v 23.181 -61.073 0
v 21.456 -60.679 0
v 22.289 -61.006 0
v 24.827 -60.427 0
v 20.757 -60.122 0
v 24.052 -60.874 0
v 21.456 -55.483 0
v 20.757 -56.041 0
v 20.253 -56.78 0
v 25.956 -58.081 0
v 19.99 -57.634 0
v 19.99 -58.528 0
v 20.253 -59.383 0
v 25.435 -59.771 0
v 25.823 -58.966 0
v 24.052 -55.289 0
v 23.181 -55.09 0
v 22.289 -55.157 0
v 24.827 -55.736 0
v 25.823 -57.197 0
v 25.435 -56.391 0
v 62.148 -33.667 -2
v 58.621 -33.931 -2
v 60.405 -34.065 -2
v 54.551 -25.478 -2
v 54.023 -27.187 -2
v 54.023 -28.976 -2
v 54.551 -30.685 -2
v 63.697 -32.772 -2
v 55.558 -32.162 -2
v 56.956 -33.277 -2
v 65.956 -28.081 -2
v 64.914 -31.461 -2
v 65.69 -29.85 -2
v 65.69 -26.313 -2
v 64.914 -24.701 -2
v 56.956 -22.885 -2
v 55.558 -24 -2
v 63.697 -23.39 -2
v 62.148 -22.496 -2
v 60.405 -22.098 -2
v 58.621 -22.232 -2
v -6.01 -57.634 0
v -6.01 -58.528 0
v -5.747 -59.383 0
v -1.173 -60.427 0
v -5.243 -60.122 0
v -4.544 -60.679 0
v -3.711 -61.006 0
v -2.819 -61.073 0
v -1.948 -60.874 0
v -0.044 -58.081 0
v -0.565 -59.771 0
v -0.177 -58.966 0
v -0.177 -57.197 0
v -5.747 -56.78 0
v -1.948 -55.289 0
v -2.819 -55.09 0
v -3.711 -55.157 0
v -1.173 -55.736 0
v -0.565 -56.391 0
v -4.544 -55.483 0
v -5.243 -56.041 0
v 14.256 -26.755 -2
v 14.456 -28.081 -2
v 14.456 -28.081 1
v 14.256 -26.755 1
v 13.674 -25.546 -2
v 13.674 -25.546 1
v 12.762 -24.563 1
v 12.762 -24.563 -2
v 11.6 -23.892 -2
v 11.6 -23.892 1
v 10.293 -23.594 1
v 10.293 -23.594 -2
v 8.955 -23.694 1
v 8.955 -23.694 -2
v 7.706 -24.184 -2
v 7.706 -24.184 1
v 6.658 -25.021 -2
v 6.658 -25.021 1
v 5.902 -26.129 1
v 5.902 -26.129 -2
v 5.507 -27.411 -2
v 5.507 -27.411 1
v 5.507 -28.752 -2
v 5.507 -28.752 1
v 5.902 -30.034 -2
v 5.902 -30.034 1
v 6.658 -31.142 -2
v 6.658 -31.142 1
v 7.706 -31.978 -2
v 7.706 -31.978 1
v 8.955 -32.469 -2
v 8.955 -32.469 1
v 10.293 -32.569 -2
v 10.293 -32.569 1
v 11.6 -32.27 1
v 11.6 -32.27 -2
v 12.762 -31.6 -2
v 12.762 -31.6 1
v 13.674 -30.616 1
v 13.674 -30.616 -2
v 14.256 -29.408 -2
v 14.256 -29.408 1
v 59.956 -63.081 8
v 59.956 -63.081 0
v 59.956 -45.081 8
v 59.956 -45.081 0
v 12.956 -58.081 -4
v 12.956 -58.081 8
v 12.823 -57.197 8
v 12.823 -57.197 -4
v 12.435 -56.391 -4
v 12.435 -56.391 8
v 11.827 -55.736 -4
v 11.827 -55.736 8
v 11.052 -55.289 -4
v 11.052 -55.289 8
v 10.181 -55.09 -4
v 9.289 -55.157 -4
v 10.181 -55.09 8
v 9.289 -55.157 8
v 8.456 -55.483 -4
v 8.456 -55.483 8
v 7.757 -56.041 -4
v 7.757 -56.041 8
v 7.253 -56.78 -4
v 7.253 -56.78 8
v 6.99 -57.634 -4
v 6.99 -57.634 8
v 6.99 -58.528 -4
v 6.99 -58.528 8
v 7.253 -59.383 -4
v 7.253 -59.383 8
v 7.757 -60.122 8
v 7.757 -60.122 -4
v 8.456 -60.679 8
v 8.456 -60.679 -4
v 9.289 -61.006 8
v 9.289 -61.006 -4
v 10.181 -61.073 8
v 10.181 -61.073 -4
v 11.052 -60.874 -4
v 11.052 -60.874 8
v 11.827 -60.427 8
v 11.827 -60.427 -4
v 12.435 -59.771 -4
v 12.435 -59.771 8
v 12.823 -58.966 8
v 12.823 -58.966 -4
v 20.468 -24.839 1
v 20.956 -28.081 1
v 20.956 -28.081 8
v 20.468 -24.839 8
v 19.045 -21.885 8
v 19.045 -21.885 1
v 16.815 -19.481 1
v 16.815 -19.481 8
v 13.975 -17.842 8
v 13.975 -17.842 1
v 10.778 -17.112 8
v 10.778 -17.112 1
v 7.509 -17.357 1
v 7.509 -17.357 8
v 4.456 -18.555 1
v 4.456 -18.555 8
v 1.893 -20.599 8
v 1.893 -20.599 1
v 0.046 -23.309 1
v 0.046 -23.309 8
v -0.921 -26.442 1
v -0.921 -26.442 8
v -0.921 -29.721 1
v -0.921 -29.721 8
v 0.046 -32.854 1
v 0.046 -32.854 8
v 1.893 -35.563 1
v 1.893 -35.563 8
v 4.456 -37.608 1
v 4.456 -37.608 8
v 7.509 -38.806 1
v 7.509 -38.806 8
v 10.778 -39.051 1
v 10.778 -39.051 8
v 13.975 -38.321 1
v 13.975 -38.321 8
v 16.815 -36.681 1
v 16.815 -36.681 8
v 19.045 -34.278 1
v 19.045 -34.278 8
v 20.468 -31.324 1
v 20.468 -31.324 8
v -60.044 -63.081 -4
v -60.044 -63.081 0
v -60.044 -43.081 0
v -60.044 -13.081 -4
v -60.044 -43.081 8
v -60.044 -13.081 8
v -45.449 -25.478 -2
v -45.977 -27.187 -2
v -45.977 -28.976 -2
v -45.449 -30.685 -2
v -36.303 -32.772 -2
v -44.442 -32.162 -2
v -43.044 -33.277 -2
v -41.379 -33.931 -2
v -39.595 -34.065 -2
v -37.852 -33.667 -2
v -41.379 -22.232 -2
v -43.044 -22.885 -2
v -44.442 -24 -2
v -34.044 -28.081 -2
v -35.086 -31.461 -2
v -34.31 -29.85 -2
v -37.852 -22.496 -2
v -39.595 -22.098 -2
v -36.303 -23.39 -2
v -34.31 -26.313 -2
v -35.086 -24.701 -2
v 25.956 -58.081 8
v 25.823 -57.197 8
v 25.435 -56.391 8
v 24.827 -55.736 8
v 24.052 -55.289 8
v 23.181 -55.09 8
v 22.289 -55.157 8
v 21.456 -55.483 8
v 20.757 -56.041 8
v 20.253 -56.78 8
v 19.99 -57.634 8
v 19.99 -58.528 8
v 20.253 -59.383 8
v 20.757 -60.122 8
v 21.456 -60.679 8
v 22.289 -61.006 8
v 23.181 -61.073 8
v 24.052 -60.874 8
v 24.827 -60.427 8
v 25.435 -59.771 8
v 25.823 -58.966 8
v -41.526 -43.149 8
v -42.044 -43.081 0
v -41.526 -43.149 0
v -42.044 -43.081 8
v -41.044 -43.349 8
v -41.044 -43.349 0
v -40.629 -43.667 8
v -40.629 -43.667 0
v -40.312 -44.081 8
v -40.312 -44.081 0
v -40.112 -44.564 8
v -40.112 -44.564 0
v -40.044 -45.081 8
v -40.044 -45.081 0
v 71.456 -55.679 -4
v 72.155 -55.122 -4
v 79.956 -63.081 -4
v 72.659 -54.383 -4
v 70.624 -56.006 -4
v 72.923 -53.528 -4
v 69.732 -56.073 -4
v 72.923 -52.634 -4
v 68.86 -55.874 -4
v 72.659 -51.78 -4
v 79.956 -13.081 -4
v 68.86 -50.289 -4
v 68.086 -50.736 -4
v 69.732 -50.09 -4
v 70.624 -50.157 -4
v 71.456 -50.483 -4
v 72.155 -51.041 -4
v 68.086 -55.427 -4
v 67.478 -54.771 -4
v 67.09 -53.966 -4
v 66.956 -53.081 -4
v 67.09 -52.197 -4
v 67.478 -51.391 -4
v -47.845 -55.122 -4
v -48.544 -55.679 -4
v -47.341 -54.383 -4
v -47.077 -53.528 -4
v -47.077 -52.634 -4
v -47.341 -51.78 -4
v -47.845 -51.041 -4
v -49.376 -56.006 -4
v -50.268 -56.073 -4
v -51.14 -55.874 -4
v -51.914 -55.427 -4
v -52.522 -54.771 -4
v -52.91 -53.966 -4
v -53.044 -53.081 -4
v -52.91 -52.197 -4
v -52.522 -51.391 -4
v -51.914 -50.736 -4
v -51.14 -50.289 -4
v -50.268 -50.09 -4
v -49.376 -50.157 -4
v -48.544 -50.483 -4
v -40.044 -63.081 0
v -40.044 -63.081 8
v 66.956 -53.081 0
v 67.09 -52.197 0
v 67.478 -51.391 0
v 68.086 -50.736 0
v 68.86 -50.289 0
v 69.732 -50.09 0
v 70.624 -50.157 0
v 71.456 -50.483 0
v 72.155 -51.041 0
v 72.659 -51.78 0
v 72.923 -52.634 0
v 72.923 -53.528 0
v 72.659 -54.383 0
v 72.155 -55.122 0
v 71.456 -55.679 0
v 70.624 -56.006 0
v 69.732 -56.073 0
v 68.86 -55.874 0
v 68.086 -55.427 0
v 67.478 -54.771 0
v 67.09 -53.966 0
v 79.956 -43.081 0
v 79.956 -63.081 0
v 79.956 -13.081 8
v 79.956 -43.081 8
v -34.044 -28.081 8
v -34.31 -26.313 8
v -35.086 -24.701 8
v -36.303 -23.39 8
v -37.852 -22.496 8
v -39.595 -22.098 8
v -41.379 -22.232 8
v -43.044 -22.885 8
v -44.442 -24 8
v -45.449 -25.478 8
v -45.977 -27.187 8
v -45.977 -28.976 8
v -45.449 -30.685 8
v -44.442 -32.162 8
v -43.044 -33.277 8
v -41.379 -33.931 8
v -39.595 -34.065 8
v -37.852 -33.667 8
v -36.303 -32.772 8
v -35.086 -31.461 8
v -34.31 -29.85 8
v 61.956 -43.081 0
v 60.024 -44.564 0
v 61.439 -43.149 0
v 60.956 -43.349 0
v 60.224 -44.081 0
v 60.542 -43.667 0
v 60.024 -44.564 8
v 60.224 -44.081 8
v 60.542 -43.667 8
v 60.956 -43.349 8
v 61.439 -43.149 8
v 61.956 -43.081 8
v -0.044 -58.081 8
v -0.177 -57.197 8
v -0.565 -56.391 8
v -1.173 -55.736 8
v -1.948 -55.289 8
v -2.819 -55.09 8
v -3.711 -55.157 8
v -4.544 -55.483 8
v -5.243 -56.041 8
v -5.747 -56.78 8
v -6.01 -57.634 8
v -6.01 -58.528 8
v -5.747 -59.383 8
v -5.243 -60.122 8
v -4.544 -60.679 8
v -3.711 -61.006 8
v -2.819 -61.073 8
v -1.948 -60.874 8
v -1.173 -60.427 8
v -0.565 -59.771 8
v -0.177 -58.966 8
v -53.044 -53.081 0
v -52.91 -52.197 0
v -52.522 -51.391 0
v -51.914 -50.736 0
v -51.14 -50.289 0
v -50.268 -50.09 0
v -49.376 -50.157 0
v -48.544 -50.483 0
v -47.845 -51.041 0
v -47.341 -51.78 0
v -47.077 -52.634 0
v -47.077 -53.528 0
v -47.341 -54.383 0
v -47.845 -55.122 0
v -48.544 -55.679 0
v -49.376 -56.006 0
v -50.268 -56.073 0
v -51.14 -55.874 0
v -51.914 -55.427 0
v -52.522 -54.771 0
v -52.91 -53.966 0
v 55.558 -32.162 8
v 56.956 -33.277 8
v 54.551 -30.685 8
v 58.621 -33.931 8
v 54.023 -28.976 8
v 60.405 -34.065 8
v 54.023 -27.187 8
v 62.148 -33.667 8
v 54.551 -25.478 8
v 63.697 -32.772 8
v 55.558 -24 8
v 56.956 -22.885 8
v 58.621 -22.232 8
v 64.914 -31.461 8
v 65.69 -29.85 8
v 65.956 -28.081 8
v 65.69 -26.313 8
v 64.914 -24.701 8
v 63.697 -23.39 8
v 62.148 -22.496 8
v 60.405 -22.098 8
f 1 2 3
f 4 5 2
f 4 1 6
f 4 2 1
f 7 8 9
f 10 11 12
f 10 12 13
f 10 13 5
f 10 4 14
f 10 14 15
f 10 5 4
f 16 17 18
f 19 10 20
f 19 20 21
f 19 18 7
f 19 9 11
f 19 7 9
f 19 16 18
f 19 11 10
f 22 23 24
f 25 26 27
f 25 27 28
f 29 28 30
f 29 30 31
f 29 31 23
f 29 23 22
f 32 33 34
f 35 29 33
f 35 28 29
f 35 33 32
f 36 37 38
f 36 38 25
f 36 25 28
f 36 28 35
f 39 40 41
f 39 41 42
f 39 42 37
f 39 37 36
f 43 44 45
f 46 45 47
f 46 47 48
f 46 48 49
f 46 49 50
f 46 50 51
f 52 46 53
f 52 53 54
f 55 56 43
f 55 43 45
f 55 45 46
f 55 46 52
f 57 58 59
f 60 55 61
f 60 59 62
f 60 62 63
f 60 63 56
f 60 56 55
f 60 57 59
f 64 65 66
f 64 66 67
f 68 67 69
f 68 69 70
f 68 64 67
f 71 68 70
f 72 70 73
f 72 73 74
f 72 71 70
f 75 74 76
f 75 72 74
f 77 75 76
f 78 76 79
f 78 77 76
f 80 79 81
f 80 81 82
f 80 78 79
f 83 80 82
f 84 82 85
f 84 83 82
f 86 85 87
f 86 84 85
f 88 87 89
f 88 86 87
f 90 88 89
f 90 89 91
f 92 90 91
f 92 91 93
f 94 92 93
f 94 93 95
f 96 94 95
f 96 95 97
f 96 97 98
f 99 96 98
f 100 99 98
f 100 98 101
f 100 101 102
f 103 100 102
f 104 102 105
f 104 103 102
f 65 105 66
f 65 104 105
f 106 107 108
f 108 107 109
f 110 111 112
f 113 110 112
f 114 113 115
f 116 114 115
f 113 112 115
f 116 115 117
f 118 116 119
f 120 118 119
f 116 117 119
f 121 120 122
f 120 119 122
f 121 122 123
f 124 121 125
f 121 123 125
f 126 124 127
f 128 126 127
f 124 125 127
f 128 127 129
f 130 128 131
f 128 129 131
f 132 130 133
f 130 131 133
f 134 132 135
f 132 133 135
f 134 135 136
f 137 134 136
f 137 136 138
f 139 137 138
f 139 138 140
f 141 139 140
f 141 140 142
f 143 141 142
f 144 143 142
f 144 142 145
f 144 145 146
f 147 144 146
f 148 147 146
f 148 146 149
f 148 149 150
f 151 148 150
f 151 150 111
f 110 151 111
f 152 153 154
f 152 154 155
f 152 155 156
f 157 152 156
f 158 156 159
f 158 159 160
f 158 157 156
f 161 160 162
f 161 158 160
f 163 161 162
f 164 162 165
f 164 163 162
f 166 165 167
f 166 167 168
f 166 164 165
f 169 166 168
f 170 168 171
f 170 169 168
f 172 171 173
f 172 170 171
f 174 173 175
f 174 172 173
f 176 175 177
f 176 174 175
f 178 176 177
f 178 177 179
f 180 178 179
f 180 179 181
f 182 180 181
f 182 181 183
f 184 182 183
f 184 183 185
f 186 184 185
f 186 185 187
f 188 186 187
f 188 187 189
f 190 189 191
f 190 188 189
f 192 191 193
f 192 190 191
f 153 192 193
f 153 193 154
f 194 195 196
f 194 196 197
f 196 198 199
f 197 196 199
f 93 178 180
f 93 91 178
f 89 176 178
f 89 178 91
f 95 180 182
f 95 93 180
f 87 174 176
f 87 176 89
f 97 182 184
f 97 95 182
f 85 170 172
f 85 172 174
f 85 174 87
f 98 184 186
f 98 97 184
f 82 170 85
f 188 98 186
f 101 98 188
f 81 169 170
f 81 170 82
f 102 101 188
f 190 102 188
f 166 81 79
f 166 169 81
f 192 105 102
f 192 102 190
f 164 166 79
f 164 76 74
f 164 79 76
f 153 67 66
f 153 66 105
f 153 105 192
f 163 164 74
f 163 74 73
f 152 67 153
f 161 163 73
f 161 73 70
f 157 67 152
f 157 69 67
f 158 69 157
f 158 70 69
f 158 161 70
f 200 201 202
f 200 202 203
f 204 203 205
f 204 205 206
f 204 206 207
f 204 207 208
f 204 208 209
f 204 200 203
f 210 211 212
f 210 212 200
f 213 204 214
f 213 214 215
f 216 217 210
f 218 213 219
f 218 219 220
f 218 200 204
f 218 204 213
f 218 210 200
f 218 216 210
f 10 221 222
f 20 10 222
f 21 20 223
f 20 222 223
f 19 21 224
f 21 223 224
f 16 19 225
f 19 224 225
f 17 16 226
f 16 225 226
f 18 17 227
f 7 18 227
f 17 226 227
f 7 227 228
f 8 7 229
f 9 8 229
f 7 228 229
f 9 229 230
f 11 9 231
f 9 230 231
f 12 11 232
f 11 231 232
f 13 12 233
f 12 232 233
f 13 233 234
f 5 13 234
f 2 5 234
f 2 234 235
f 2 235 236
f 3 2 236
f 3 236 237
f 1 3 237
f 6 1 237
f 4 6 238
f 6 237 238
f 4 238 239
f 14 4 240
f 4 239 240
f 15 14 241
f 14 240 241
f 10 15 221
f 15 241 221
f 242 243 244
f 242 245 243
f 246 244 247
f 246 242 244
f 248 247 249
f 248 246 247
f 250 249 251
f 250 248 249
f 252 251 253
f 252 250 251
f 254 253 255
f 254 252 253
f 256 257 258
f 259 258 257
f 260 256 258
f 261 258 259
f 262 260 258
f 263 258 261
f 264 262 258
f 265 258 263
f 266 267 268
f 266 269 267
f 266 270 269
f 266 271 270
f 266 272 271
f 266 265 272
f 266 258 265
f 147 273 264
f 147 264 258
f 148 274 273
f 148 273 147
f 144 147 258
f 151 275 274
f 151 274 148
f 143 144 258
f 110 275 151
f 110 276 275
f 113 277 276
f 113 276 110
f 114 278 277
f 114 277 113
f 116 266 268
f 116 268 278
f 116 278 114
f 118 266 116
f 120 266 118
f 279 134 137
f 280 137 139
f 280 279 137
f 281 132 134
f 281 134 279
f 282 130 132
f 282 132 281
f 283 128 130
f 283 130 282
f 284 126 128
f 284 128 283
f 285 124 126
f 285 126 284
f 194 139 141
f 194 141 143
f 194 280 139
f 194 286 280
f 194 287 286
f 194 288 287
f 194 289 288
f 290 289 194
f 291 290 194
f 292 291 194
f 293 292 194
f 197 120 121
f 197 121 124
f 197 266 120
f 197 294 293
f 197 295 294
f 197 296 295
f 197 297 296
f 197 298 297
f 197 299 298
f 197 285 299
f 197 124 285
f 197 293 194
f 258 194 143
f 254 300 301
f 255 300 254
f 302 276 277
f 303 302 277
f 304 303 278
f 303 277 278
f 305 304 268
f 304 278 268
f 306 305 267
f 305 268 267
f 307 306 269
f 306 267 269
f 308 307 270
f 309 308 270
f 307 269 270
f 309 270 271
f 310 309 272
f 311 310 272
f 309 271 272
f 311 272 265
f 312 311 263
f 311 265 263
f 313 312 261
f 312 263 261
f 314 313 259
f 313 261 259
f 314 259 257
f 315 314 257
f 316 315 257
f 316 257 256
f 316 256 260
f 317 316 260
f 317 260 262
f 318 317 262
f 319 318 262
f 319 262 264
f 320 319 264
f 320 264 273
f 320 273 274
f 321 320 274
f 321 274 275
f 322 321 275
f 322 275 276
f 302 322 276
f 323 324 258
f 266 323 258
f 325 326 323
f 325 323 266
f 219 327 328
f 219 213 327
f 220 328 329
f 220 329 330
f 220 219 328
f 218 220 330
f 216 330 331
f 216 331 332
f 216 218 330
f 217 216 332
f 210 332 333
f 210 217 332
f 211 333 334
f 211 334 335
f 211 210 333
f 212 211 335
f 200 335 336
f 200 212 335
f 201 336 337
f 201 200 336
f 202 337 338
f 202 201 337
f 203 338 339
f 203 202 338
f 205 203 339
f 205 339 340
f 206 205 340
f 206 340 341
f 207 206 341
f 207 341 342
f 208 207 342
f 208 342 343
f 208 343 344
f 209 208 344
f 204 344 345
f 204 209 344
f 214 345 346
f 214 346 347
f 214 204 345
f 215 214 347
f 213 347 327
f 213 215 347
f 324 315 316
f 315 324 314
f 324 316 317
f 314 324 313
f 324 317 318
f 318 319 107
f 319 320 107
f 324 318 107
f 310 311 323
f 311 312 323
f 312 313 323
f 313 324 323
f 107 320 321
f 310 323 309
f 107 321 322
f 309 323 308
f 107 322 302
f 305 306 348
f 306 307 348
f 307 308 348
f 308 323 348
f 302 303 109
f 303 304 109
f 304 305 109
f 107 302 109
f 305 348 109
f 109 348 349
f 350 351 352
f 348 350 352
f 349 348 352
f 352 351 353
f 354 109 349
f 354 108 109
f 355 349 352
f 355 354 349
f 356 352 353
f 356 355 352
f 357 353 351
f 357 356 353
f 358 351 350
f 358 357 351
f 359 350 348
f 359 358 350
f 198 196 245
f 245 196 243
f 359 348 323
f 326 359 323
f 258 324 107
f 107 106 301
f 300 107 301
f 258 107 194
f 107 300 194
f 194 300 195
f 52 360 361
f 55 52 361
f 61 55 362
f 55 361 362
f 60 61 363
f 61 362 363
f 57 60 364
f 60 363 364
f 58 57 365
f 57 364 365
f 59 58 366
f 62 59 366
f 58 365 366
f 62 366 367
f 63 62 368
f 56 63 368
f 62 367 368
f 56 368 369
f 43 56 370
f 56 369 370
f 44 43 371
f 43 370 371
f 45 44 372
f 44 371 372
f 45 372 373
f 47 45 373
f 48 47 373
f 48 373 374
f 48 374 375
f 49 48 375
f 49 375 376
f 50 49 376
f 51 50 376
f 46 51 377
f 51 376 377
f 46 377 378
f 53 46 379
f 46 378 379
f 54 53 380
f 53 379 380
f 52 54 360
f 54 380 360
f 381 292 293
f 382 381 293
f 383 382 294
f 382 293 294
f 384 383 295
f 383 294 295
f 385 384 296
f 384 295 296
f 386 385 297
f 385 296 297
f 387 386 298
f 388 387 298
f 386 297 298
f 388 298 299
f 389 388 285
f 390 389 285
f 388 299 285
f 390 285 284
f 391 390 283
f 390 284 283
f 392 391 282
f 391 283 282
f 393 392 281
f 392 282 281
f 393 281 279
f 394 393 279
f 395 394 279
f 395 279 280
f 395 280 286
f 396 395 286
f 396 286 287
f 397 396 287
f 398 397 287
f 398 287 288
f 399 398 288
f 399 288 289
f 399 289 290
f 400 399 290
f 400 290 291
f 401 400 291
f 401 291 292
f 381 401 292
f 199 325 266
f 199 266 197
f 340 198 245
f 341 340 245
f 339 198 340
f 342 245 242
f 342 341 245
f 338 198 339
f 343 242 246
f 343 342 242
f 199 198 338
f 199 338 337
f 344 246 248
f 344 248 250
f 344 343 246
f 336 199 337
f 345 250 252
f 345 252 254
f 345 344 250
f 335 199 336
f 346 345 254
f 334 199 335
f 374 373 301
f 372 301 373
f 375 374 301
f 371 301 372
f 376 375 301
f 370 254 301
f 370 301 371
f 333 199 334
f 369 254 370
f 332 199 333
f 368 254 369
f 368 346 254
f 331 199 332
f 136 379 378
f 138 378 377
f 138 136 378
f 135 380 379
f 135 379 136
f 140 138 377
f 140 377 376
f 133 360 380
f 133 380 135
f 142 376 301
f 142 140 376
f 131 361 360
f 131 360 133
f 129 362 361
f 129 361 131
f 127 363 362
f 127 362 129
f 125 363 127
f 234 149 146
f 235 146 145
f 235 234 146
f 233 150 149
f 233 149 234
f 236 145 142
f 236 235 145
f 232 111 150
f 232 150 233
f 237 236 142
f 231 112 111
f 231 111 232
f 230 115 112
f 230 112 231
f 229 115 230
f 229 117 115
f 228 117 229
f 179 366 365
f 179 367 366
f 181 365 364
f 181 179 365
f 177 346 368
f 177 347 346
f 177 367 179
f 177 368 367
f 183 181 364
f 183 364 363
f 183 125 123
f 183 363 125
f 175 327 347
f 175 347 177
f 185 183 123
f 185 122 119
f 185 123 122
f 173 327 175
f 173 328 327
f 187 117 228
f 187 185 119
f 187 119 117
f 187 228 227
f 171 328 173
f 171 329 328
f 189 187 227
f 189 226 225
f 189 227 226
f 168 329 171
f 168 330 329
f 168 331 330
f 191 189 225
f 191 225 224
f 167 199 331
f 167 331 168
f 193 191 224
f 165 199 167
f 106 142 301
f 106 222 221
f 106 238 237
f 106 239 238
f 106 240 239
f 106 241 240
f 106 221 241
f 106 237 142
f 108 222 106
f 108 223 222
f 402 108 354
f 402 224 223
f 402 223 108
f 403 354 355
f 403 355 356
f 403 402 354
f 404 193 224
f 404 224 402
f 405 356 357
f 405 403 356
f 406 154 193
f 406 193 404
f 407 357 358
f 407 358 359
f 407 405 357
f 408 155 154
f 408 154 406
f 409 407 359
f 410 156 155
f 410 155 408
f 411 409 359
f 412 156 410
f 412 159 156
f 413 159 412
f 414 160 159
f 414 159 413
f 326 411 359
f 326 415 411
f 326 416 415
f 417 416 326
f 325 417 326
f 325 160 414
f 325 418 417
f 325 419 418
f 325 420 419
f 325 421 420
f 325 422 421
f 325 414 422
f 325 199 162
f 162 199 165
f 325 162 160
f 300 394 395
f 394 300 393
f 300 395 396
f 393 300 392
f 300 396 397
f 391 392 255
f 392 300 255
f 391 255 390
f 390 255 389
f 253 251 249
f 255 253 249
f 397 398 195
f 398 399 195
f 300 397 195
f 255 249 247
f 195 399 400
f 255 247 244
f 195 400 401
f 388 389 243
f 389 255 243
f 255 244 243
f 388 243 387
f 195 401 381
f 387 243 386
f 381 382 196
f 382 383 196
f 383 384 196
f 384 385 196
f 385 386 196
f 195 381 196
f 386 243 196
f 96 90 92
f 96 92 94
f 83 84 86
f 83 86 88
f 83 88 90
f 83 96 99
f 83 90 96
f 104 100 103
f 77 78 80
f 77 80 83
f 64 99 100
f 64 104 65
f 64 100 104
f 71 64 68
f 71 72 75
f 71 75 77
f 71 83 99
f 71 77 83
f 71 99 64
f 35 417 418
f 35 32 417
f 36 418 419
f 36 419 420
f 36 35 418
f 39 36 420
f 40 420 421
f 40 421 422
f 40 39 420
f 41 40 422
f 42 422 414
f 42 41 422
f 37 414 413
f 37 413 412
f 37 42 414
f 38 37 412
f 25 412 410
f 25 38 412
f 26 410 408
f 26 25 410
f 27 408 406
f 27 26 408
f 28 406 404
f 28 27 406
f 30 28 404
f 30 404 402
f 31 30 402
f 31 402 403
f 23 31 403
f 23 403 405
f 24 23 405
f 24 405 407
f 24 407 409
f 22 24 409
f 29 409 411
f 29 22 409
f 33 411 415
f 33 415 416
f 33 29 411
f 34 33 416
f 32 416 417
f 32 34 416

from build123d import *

# Parameters (mm, degrees)
ESQUISSE1_W             = 140
ESQUISSE1_H             = 30
ESQUISSE1_R             = 11
ESQUISSE1_R_2           = 6
EXTRUSION1_DEPTH        = 8
ESQUISSE2_W             = 140
ESQUISSE2_H             = 50
BOSS_EXTRU_1_DEPTH      = 4
ESQUISSE3_R             = 3
ENL_V_MAT_EXTRU_1_DEPTH = 13
ESQUISSE4_R             = 11
ENL_V_MAT_EXTRU_2_DEPTH = 2
ESQUISSE5_W             = 100
ESQUISSE5_H             = 20
BOSS_EXTRU_2_DEPTH      = 8
ESQUISSE6_R             = 3
ENL_V_MAT_EXTRU_3_DEPTH = 8
ESQUISSE8_R             = 6
ENL_V_MAT_EXTRU_4_DEPTH = 2
ESQUISSE9_R             = 11
ESQUISSE9_R_2           = 4.5
BOSS_EXTRU_3_DEPTH      = 3
ESQUISSE10_R            = 3
ENL_V_MAT_EXTRU_5_DEPTH = 13
CONG_1_R                = 2
CONG_2_R                = 2


with BuildPart() as part:
    # Esquisse1 → Extrusion1 (new body)
    with BuildSketch(Plane.XY):
        with Locations((9.95634141, -28.081325038)):
            Rectangle(ESQUISSE1_W, ESQUISSE1_H)
        with Locations((9.95634141, -28.081325038)):
            Circle(ESQUISSE1_R, mode=Mode.SUBTRACT)
        with Locations((-40.04365859, -28.081325038)):
            Circle(ESQUISSE1_R_2, mode=Mode.SUBTRACT)
        with Locations((59.95634141, -28.081325038)):
            Circle(ESQUISSE1_R_2, mode=Mode.SUBTRACT)
    extrude(amount=EXTRUSION1_DEPTH)

    # Esquisse2 → Boss.-Extru.1 (add)
    with BuildSketch(Plane(origin=(0, 0, 0), x_dir=(-1, 0, 0), z_dir=(0, 0, -1))):
        with Locations((-9.95634141, -38.081325038)):
            Rectangle(ESQUISSE2_W, ESQUISSE2_H)
    extrude(amount=BOSS_EXTRU_1_DEPTH)

    # Esquisse3 → Enlèv. mat.-Extru.1 (cut, through all)
    with BuildSketch(Plane(origin=(0, 0, -4), x_dir=(-1, 0, 0), z_dir=(0, 0, -1))):
        with Locations((-69.95634141, -53.081325038)):
            Circle(ESQUISSE3_R)
        with Locations((50.04365859, -53.081325038)):
            Circle(ESQUISSE3_R)
    extrude(amount=-ENL_V_MAT_EXTRU_1_DEPTH, mode=Mode.SUBTRACT)

    # Esquisse4 → Enlèv. mat.-Extru.2 (cut)
    with BuildSketch(Plane.XY):
        with Locations((9.95634141, -28.081325038)):
            Circle(ESQUISSE4_R)
    extrude(amount=-ENL_V_MAT_EXTRU_2_DEPTH, mode=Mode.SUBTRACT)

    # Esquisse5 → Boss.-Extru.2 (add)
    with BuildSketch(Plane.XY):
        with Locations((9.95634141, -53.081325038)):
            Rectangle(ESQUISSE5_W, ESQUISSE5_H)
    extrude(amount=BOSS_EXTRU_2_DEPTH)

    # Esquisse6 → Enlèv. mat.-Extru.3 (cut)
    with BuildSketch(Plane.XY.offset(8)):
        with Locations((22.95634141, -58.081325038)):
            Circle(ESQUISSE6_R)
        with Locations((-3.04365859, -58.081325038)):
            Circle(ESQUISSE6_R)
    extrude(amount=-ENL_V_MAT_EXTRU_3_DEPTH, mode=Mode.SUBTRACT)

    # Esquisse8 → Enlèv. mat.-Extru.4 (cut)
    with BuildSketch(Plane.XY):
        with Locations((-40.04365859, -28.081325038)):
            Circle(ESQUISSE8_R)
        with Locations((59.95634141, -28.081325038)):
            Circle(ESQUISSE8_R)
    extrude(amount=-ENL_V_MAT_EXTRU_4_DEPTH, mode=Mode.SUBTRACT)

    # Esquisse9 → Boss.-Extru.3 (add)
    with BuildSketch(Plane.XY.offset(-2)):
        with Locations((9.95634141, -28.081325038)):
            Circle(ESQUISSE9_R)
        with Locations((9.95634141, -28.081325038)):
            Circle(ESQUISSE9_R_2, mode=Mode.SUBTRACT)
    extrude(amount=BOSS_EXTRU_3_DEPTH)

    # Esquisse10 → Enlèv. mat.-Extru.5 (cut, through all)
    with BuildSketch(Plane.XY.offset(8)):
        with Locations((9.95634141, -58.081325038)):
            Circle(ESQUISSE10_R)
    extrude(amount=-ENL_V_MAT_EXTRU_5_DEPTH, mode=Mode.SUBTRACT)

    # Congé1
    cong_1_edges = [part.edges().sort_by_distance(p)[0] for p in [
        (-40.04365859, -43.081325038, 4),
    ]]
    fillet(cong_1_edges, radius=CONG_1_R)

    # Congé2
    cong_2_edges = [part.edges().sort_by_distance(p)[0] for p in [
        (59.95634141, -43.081325038, 4),
    ]]
    fillet(cong_2_edges, radius=CONG_2_R)


solid = part.part
